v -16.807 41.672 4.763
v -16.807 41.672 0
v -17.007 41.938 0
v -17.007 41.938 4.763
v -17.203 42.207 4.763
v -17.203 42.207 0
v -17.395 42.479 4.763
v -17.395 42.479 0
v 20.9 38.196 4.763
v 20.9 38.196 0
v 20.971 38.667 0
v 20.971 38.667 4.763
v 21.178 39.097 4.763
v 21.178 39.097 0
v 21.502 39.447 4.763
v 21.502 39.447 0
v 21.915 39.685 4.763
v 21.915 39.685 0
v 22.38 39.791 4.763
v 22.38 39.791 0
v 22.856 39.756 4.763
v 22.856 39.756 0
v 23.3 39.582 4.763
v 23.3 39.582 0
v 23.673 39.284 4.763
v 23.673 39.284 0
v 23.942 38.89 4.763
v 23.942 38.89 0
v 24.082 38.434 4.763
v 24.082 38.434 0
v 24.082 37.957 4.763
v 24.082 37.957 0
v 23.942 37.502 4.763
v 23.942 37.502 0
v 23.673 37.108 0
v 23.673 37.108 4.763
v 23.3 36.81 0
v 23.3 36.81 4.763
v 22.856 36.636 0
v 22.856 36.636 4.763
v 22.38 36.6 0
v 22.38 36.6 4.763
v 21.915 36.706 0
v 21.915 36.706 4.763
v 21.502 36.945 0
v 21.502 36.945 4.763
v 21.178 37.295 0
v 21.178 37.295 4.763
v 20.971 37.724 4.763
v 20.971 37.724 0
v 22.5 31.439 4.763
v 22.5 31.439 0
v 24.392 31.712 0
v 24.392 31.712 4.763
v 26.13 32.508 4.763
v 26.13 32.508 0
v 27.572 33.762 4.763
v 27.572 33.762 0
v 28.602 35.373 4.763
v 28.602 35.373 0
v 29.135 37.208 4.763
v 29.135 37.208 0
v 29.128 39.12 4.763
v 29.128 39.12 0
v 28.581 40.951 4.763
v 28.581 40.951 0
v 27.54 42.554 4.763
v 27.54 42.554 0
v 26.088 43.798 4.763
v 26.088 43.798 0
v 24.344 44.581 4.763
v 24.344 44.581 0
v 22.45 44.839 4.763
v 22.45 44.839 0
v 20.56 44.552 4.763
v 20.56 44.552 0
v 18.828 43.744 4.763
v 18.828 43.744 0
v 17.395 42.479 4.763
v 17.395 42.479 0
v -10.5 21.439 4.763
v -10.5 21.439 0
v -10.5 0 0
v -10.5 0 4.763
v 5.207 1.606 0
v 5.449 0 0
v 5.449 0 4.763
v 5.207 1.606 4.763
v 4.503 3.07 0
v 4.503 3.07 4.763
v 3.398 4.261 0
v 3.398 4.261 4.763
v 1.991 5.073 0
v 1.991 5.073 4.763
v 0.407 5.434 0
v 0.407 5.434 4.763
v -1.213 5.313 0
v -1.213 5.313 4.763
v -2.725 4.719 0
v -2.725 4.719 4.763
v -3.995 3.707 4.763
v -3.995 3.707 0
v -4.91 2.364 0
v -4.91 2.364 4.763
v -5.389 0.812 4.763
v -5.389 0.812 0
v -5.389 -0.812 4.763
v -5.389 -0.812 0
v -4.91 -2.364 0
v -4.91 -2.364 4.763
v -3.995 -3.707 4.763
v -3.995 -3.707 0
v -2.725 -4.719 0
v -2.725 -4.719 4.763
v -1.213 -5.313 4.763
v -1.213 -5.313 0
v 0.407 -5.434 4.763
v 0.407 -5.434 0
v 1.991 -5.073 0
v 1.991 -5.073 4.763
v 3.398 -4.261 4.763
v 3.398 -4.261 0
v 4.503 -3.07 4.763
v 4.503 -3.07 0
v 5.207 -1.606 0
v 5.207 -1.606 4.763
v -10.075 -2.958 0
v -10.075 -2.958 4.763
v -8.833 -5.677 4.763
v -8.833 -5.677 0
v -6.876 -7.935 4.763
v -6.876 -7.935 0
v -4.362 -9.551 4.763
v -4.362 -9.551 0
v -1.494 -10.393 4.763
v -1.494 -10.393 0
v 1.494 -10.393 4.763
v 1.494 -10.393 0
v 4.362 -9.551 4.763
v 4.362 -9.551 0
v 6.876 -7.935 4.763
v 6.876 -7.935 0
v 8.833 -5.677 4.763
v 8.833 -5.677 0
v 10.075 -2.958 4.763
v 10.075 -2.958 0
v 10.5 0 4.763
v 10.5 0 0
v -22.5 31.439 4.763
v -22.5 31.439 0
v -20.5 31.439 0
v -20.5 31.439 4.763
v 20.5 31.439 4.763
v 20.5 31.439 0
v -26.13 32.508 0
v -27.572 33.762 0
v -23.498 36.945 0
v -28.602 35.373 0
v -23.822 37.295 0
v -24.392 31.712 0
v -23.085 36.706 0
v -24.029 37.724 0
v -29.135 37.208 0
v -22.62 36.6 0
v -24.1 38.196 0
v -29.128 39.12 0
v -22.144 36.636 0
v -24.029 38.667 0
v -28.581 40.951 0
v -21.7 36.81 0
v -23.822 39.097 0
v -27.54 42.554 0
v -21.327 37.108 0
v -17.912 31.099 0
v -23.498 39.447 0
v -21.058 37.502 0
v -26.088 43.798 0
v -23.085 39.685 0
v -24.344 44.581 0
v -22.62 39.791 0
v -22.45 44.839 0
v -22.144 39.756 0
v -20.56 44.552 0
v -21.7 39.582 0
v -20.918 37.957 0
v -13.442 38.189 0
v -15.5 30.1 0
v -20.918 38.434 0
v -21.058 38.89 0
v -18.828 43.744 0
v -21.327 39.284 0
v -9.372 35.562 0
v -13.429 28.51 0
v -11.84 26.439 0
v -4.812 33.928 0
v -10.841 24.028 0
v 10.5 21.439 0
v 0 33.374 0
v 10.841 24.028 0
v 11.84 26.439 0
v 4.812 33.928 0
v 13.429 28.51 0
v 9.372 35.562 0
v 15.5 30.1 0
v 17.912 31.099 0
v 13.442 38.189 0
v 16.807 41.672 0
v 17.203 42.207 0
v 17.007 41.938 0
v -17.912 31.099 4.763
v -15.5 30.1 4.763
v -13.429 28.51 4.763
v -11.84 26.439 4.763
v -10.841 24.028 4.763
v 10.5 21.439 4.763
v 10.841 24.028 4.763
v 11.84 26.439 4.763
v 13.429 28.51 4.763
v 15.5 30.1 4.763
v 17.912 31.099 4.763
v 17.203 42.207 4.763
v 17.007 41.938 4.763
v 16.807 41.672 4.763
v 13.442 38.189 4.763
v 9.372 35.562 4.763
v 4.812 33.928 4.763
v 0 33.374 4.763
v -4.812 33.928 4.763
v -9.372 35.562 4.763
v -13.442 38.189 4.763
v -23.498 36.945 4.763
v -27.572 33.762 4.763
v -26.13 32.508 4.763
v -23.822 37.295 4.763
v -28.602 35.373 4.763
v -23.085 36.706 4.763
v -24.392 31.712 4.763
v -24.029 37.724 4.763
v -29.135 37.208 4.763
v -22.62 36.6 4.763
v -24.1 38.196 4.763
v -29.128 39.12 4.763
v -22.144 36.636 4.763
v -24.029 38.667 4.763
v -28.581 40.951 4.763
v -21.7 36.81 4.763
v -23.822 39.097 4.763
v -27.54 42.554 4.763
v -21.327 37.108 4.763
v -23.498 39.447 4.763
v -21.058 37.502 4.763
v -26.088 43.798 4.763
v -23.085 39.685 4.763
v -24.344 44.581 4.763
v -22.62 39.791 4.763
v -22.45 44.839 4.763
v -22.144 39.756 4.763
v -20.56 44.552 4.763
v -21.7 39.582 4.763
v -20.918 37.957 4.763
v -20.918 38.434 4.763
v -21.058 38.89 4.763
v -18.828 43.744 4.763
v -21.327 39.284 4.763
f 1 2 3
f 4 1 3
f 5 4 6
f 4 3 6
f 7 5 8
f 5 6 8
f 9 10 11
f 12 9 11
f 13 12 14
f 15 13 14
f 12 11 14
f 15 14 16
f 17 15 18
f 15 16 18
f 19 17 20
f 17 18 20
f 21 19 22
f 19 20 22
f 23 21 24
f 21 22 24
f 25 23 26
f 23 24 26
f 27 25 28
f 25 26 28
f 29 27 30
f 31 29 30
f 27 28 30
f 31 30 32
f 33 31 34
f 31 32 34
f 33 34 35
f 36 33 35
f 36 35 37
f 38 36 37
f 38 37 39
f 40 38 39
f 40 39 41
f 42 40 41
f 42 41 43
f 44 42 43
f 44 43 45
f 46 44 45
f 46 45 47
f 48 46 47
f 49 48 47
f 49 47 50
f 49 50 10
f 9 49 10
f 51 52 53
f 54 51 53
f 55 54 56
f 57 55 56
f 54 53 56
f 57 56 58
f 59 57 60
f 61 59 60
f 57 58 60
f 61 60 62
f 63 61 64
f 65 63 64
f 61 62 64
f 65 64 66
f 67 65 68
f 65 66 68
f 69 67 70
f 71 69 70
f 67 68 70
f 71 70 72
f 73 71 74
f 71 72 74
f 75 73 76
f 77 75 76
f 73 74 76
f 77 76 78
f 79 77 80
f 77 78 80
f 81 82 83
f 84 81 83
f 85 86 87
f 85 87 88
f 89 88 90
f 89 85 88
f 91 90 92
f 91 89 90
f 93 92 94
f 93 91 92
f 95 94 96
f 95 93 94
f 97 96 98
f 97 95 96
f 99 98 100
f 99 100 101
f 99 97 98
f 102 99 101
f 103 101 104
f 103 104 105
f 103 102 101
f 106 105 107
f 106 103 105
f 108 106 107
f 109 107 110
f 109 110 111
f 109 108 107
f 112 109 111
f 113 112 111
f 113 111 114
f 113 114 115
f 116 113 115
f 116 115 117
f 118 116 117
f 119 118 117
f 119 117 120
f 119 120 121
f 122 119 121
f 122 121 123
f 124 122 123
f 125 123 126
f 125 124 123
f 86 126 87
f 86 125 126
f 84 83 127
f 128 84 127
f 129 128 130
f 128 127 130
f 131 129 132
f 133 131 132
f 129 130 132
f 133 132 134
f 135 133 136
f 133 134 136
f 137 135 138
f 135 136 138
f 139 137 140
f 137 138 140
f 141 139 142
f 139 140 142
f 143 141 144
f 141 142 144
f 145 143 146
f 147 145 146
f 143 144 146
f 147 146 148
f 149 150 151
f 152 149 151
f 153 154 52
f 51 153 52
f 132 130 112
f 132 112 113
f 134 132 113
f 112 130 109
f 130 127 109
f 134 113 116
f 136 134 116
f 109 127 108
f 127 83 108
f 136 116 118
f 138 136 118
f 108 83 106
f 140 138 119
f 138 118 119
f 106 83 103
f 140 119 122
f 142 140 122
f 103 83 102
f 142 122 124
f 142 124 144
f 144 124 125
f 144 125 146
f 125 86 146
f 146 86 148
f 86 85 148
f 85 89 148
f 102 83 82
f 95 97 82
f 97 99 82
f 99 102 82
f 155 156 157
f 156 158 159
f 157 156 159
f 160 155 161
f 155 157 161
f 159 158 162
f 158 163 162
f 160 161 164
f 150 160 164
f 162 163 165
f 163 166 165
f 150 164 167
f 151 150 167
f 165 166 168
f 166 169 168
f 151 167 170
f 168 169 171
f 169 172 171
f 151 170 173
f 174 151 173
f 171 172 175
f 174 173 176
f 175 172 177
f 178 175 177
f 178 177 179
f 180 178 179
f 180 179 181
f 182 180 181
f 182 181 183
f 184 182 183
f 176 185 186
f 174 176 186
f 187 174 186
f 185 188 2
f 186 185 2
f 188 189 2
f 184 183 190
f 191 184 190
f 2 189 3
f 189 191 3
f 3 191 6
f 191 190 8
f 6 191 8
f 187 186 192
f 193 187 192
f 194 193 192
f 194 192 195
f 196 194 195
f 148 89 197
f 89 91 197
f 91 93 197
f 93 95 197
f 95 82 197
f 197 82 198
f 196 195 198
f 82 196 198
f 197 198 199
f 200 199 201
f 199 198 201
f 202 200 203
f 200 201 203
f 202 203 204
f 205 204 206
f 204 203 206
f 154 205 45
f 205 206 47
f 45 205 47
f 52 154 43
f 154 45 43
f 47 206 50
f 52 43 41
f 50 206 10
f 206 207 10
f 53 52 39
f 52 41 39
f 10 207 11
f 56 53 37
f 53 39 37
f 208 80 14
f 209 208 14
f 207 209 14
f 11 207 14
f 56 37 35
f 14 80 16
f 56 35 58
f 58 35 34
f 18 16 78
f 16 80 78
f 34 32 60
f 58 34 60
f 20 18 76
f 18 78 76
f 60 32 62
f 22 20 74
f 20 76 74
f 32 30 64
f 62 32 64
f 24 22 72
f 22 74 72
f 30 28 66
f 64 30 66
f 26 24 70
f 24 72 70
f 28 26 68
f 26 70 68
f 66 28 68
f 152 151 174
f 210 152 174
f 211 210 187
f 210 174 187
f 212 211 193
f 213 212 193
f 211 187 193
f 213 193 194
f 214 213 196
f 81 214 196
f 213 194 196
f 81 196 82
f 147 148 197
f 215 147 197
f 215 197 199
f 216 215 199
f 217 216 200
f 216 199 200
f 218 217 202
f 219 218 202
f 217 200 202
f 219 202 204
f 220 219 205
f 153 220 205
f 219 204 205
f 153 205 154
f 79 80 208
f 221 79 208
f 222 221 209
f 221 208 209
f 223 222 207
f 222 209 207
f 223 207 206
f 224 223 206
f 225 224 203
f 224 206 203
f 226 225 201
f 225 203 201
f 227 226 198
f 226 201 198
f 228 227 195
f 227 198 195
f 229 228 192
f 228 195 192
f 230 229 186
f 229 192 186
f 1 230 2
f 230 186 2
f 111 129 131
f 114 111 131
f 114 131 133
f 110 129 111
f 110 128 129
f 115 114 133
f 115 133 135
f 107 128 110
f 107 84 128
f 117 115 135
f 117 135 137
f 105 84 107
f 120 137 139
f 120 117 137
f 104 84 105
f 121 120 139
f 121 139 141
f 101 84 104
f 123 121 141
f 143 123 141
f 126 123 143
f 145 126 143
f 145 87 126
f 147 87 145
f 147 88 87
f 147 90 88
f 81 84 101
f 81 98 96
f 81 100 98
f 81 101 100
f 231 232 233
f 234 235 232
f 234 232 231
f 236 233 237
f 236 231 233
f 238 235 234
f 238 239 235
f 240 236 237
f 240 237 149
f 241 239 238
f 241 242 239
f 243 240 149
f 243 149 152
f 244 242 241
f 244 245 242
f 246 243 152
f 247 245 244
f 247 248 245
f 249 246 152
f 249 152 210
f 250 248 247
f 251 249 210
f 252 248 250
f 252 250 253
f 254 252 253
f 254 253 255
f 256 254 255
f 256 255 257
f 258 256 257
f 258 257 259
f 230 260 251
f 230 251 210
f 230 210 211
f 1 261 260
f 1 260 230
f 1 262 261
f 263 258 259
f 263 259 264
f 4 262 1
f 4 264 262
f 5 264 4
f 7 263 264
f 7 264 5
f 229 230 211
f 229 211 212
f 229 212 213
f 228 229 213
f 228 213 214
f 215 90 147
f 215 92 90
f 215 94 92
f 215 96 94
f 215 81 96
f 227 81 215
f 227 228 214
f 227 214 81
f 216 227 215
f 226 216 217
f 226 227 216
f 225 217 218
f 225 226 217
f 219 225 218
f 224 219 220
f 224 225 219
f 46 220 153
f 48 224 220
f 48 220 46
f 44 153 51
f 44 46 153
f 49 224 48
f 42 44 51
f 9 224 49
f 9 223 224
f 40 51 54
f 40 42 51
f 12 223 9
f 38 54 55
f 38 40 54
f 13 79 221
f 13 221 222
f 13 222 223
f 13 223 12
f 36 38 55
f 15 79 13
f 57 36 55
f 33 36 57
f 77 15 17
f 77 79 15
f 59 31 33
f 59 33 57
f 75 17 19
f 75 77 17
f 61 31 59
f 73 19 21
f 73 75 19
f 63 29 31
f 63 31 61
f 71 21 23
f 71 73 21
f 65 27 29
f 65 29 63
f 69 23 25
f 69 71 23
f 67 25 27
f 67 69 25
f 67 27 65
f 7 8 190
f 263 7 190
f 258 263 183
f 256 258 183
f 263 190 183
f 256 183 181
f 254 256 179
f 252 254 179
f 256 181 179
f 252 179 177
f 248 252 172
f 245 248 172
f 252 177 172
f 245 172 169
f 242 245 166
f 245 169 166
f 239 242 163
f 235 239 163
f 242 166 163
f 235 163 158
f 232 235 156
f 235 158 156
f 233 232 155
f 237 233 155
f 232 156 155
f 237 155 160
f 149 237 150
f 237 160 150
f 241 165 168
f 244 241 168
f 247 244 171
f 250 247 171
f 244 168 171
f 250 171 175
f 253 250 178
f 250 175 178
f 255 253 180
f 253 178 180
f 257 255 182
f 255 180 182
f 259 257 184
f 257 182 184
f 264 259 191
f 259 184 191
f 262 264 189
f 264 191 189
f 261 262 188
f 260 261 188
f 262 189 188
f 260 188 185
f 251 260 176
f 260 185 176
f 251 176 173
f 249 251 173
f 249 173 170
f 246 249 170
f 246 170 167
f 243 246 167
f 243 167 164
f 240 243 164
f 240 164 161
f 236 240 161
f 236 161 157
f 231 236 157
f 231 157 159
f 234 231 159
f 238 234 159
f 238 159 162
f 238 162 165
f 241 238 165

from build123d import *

# Parameters (mm, degrees)
SKETCH1_R            = 5.44942
BOSS_EXTRUDE1_DEPTH  = 4.763
M3_CLEARANCE_HOLE1_D = 3.2


with BuildPart() as part:
    # Sketch1 → Boss-Extrude1 (new body)
    with BuildSketch(Plane.XY):
        with BuildLine():
            ThreePointArc((10.5, 21.439339413), (13.428932188, 28.510407225), (20.5, 31.439339413))
            Line((20.5, 31.439339413), (22.5, 31.439339413))
            ThreePointArc((22.5, 31.439339413), (28.581287214, 40.95144642), (17.395155109, 42.478758572))
            ThreePointArc((17.395155109, 42.478758572), (17.105956053, 42.072123099), (16.807253326, 41.672416728))
            ThreePointArc((16.807253326, 41.672416728), (0, 33.374189215), (-16.807253326, 41.672416728))
            ThreePointArc((-16.807253326, 41.672416728), (-17.105956053, 42.072123099), (-17.395155109, 42.478758572))
            ThreePointArc((-17.395155109, 42.478758572), (-28.581287214, 40.95144642), (-22.5, 31.439339413))
            Line((-22.5, 31.439339413), (-20.5, 31.439339413))
            ThreePointArc((-20.5, 31.439339413), (-13.428932188, 28.510407225), (-10.5, 21.439339413))
            Line((-10.5, 21.439339413), (-10.5, 0))
            ThreePointArc((-10.5, 0), (0, -10.5), (10.5, 0))
            Line((10.5, 0), (10.5, 21.439339413))
        make_face()
        Circle(SKETCH1_R, mode=Mode.SUBTRACT)
    extrude(amount=BOSS_EXTRUDE1_DEPTH)

    # M3 Clearance Hole1 (through all)
    with Locations(Plane.XY.offset(4.763)):
        with Locations((-22.5, 38.195891618), (22.5, 38.195891618)):
            Hole(M3_CLEARANCE_HOLE1_D / 2)


solid = part.part
